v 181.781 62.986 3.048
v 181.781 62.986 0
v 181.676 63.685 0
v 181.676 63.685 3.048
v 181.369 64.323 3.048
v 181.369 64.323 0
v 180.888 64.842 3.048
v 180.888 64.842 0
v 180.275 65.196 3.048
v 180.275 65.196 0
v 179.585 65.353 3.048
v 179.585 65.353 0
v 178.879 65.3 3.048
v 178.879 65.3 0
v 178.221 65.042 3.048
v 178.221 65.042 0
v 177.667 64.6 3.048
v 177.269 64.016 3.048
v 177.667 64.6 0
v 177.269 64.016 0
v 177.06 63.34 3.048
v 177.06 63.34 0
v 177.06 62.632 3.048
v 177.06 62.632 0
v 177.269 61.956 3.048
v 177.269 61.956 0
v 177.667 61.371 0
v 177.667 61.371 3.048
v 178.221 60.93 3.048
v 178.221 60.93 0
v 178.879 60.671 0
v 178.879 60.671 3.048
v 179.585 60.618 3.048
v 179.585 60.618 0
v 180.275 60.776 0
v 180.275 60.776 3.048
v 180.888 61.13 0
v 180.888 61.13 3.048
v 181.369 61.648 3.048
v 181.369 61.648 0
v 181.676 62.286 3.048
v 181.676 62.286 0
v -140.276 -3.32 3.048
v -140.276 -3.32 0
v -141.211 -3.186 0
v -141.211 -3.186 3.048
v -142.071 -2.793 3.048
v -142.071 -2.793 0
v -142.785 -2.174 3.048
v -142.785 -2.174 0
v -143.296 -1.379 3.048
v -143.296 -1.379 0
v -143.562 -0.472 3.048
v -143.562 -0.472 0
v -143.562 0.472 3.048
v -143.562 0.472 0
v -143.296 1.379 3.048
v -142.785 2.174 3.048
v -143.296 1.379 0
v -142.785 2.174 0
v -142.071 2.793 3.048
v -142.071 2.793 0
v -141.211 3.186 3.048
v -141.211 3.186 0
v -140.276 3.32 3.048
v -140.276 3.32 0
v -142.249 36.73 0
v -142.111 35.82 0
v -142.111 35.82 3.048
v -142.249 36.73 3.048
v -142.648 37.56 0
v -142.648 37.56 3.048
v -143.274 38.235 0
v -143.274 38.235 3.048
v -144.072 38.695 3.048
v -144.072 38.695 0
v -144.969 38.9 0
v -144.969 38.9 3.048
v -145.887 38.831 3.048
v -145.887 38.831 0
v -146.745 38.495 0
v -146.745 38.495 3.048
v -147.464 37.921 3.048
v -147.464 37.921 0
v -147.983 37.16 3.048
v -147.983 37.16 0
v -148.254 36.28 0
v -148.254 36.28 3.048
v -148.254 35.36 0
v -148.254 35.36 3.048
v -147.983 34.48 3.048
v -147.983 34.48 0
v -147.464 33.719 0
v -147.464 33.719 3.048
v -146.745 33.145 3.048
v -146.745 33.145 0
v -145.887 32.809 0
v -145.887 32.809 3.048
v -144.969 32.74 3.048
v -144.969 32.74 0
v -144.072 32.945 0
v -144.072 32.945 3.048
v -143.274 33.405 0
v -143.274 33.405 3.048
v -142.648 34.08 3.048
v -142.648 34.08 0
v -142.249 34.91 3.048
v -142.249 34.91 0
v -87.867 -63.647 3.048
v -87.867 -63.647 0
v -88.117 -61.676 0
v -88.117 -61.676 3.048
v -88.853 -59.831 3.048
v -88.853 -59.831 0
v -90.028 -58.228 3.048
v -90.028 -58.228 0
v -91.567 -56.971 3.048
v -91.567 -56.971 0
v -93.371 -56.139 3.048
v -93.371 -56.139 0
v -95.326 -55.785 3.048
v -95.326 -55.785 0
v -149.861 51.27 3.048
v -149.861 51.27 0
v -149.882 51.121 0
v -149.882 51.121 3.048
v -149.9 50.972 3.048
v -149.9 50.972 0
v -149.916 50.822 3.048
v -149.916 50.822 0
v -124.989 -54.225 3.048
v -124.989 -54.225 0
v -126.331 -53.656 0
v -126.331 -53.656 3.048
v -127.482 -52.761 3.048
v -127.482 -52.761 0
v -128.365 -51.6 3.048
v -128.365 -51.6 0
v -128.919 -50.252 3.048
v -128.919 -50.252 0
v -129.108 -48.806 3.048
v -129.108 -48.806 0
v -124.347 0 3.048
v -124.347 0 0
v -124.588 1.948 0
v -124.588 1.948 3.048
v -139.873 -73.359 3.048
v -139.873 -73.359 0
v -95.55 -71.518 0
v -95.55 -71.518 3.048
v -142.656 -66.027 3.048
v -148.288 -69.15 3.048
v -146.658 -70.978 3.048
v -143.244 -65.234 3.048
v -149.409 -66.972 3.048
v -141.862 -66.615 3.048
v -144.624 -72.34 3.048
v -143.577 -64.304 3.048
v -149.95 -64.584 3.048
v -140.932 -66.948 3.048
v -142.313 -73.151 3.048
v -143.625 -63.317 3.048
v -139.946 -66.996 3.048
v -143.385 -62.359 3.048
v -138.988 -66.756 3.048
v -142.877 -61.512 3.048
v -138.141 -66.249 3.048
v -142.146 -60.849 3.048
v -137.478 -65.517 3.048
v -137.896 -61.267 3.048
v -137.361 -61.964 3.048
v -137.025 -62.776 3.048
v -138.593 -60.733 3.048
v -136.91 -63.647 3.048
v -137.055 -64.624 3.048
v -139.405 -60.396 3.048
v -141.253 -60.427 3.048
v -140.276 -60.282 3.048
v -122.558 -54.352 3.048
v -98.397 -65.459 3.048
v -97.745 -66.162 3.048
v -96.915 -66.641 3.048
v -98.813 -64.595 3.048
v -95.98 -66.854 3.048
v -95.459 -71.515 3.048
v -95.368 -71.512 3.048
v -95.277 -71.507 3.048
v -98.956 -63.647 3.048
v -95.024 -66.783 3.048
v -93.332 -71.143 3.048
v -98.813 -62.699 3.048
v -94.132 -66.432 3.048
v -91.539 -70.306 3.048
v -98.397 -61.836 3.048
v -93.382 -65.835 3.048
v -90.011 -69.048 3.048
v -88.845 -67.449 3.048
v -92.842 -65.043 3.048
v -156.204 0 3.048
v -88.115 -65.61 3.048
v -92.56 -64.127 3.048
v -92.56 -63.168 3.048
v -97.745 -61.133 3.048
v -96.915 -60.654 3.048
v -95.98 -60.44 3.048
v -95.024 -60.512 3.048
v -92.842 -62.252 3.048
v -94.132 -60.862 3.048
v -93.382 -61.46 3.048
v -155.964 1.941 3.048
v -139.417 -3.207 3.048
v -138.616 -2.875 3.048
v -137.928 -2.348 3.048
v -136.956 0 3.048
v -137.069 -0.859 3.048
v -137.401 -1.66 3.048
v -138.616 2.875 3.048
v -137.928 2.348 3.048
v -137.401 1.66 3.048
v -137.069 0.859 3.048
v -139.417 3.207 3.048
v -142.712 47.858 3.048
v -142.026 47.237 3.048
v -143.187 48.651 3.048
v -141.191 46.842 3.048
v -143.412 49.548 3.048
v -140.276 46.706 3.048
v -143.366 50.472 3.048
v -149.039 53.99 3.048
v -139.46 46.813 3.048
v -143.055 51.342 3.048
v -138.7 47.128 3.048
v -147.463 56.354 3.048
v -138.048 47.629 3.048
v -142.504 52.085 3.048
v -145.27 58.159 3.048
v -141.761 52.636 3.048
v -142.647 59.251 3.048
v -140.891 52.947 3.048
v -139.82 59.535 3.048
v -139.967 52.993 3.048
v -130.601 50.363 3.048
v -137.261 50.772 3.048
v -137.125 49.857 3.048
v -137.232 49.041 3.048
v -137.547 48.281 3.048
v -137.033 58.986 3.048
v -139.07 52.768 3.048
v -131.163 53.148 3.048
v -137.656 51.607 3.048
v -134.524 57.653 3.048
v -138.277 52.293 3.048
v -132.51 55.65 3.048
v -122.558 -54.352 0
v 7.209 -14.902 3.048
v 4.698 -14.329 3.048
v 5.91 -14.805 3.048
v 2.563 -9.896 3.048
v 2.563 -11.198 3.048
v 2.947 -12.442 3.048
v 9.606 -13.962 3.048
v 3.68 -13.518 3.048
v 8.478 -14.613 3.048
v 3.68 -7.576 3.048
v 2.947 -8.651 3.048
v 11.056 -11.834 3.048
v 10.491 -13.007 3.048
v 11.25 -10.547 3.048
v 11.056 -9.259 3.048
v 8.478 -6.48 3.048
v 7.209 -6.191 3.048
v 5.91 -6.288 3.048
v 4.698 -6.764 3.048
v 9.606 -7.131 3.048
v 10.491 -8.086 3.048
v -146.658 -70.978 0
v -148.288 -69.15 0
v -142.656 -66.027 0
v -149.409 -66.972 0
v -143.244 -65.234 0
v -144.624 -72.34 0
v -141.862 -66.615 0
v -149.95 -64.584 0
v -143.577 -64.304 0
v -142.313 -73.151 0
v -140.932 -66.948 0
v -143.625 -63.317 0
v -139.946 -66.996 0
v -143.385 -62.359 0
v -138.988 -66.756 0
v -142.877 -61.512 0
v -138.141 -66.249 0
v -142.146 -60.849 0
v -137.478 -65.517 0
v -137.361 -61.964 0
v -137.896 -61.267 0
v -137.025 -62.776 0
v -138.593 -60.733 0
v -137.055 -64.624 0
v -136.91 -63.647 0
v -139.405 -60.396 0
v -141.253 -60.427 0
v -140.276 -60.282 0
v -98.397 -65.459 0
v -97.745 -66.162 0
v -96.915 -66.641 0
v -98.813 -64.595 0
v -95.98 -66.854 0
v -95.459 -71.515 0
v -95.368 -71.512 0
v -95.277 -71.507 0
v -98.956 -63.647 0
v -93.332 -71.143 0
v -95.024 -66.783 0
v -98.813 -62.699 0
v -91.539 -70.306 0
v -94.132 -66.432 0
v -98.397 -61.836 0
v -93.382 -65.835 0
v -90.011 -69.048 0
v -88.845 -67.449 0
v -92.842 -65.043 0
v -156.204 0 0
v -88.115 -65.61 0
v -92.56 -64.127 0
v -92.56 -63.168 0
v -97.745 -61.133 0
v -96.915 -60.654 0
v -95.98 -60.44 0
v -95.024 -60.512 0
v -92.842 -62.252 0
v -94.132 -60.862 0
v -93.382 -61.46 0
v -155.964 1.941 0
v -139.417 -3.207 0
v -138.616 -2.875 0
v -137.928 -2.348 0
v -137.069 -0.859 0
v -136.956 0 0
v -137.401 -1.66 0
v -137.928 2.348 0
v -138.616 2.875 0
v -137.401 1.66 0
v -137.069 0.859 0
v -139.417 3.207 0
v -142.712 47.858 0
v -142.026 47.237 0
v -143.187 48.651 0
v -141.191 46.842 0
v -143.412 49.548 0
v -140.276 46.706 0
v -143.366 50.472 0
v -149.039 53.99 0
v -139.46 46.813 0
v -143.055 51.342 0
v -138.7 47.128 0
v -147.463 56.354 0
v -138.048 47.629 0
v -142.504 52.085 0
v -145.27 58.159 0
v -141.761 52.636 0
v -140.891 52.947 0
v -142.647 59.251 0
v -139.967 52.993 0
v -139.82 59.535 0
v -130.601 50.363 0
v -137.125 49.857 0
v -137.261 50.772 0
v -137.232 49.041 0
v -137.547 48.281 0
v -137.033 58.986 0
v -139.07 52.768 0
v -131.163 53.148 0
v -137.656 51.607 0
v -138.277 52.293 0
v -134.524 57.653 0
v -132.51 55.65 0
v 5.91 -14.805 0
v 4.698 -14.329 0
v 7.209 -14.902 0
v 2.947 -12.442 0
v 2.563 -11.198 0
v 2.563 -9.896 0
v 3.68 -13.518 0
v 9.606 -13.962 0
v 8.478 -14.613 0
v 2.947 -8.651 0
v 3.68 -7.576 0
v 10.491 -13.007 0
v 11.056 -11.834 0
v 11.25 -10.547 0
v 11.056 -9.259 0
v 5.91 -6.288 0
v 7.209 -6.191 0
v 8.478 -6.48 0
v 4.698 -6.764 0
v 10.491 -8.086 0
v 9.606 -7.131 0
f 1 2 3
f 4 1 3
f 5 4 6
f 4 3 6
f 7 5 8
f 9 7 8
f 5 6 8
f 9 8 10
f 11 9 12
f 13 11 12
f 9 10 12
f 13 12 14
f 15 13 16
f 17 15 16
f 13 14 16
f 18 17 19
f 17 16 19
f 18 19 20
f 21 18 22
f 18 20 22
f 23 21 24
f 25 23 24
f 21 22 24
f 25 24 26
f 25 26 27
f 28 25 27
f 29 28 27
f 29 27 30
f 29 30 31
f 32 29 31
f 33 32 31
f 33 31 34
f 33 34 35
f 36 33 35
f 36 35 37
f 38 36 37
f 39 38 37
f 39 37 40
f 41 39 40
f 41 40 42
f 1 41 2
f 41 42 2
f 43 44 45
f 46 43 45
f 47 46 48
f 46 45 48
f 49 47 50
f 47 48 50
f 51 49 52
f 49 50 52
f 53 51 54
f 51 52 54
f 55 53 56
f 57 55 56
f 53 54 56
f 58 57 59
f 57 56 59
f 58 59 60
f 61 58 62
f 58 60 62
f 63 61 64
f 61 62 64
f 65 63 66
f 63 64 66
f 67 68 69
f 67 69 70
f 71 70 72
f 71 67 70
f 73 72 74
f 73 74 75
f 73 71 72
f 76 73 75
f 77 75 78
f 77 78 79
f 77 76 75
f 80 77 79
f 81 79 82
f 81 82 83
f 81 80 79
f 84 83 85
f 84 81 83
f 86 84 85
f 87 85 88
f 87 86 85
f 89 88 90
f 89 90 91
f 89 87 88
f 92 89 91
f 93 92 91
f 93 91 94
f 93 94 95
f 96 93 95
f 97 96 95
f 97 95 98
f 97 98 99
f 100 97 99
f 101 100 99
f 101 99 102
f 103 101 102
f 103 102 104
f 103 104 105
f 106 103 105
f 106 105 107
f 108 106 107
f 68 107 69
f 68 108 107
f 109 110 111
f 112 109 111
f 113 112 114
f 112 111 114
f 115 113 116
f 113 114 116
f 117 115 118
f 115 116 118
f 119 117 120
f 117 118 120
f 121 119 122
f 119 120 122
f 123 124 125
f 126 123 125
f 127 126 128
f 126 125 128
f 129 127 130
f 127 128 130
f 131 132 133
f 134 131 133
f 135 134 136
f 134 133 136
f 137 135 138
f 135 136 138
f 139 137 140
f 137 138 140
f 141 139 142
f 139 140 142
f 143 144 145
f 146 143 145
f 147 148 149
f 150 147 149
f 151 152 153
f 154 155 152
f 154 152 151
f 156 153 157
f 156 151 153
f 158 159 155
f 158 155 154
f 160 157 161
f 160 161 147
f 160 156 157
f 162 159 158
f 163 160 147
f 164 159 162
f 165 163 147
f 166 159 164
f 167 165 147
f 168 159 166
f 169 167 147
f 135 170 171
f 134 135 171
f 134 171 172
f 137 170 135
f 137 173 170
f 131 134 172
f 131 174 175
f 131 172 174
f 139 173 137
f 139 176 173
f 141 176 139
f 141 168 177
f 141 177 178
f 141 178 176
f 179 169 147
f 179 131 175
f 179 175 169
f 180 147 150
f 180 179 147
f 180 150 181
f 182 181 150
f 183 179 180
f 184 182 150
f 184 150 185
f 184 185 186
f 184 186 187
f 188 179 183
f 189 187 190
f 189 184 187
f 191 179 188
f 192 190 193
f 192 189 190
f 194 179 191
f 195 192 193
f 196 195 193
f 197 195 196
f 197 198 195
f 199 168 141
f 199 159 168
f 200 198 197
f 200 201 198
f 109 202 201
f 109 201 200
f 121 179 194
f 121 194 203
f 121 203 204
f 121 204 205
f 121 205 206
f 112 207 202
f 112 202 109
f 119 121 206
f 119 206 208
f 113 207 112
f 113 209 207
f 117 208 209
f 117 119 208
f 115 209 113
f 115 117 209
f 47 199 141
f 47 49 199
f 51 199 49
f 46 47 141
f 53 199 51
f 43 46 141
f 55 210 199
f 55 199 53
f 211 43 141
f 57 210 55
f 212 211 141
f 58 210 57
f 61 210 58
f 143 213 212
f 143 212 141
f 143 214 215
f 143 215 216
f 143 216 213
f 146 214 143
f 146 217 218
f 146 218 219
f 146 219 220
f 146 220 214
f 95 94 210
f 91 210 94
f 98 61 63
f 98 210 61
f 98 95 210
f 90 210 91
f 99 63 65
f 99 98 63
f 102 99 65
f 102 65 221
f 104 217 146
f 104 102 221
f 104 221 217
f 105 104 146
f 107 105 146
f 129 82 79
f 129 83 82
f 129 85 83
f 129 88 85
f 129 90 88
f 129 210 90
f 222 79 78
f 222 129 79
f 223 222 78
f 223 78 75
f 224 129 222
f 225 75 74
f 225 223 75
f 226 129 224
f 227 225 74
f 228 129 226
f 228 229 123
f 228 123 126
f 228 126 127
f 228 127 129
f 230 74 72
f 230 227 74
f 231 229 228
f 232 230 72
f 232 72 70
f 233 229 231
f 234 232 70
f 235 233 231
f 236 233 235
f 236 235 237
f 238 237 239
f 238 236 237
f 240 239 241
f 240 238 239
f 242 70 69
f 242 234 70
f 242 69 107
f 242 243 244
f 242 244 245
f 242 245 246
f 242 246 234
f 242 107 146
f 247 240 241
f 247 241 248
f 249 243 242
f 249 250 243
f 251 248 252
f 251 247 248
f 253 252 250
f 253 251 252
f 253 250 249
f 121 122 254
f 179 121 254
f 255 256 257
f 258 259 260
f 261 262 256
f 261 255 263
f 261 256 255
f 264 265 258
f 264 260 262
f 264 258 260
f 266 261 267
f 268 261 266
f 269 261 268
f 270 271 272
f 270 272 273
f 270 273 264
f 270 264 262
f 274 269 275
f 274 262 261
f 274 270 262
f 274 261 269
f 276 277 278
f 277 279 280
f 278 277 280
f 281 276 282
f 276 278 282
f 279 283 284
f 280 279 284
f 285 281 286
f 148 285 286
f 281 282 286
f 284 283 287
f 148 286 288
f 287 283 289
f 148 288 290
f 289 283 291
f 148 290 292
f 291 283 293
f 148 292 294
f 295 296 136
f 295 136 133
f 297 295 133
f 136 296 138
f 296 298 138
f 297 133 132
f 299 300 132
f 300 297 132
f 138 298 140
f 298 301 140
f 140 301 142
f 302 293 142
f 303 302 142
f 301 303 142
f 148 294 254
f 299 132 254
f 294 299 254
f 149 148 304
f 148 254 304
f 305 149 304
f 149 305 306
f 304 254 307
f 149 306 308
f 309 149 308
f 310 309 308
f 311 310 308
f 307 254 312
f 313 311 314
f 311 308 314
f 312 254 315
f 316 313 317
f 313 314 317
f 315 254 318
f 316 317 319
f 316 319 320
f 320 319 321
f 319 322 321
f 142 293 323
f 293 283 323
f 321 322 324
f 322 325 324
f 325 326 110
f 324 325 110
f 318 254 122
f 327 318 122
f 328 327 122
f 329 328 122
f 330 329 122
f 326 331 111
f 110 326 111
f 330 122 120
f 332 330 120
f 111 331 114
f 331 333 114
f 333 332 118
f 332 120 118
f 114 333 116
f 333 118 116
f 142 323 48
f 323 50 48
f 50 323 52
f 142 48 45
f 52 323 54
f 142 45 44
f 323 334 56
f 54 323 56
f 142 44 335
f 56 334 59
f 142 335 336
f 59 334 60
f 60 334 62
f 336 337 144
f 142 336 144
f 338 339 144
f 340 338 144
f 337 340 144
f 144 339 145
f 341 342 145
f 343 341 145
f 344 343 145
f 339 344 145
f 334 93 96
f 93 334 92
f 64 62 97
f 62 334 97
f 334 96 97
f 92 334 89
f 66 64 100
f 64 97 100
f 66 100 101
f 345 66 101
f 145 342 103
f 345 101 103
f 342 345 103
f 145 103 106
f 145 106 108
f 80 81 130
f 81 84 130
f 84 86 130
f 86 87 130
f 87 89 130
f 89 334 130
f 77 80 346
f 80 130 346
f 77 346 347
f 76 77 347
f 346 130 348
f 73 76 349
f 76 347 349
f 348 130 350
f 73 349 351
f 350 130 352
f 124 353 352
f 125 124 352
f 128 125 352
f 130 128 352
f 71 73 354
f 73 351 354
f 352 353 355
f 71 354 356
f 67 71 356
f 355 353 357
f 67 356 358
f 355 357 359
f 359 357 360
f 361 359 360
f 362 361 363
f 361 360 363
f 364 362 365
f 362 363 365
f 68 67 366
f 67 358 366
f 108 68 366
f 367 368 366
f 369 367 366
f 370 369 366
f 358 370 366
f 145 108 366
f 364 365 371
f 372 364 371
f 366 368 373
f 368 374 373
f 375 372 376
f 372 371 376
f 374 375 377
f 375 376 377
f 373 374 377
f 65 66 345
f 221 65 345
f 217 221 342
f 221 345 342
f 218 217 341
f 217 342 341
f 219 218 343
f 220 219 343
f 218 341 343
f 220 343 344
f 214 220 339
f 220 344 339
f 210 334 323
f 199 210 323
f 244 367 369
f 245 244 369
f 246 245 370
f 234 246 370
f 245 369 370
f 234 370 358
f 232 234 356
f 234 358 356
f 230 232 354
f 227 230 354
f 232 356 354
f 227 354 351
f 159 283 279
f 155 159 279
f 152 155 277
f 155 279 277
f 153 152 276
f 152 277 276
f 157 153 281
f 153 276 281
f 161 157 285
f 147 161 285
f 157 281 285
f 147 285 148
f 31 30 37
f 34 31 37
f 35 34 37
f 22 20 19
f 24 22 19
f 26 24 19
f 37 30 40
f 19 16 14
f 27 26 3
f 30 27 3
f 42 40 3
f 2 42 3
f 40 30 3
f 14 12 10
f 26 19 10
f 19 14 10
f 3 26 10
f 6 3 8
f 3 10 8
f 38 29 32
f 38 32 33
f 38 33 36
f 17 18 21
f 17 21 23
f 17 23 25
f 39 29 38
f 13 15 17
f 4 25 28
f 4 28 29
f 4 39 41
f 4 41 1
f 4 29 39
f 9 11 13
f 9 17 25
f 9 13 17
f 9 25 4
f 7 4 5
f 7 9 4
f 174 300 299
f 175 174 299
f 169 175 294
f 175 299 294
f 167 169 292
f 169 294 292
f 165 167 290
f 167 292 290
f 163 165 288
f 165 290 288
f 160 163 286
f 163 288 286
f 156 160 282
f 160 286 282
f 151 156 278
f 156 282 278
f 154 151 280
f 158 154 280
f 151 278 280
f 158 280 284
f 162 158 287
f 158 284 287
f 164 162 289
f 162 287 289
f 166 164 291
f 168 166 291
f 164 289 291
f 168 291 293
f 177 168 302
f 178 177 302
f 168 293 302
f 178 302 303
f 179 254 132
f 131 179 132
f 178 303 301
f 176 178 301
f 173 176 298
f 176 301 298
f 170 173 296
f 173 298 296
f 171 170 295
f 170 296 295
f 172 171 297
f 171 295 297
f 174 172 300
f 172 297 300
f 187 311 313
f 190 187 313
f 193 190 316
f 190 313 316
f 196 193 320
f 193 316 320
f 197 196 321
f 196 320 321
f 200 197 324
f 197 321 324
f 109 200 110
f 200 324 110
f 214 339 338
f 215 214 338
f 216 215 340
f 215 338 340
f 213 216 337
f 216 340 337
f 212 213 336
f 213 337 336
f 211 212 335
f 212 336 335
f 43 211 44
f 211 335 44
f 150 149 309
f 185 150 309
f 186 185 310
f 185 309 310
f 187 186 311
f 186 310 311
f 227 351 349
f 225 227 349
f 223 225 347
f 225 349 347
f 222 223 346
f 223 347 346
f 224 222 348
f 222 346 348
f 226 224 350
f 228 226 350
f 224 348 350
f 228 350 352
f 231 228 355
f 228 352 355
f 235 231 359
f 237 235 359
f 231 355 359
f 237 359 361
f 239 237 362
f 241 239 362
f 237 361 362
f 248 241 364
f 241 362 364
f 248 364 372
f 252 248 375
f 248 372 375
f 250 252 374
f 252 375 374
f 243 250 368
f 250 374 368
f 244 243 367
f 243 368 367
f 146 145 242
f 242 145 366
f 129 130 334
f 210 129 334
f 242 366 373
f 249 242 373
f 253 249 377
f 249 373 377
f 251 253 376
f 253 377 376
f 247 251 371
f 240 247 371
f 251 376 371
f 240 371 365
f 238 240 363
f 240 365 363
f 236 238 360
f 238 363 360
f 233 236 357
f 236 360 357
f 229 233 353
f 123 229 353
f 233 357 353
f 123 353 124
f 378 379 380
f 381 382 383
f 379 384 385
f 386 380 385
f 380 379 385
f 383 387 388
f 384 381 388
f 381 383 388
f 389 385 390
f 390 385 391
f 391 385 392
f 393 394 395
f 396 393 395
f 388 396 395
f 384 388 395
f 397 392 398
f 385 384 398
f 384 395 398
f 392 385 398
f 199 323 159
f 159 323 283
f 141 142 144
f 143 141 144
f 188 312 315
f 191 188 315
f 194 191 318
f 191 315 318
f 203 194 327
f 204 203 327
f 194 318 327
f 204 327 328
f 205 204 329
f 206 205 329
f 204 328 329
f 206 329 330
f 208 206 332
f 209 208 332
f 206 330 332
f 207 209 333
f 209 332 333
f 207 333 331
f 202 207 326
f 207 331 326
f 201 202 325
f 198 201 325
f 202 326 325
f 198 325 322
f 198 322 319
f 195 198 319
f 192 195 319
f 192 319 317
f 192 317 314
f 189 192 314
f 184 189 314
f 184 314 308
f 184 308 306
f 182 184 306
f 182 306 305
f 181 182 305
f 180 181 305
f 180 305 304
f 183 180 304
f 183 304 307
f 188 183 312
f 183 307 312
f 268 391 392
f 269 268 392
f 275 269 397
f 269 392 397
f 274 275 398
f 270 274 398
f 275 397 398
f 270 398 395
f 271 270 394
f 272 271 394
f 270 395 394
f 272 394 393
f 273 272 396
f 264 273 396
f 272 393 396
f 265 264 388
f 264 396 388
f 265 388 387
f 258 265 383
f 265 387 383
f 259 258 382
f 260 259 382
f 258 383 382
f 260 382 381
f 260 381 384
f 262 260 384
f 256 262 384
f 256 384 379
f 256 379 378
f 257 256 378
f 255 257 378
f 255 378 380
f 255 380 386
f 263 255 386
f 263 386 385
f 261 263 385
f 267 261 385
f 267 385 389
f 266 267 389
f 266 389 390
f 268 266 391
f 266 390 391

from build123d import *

# Parameters (mm, degrees)
F0_R     = 3.0886982289
F1_DEPTH = 3.048
F0_R_2   = 2.3739096922
F0_R_3   = 4.3680824595


with BuildPart() as f1:
    # F0 (on Top) → F1 (new body)
    with BuildSketch(Plane.XY):
        with BuildLine():
            ThreePointArc((-140.2758508921, 40.1682988362), (-133.4250060926, 43.0060116659), (-130.587293263, 49.8568564653))
            ThreePointArc((-130.587293263, 49.8568564653), (-130.5906056645, 50.1101819761), (-130.6005406042, 50.363334269))
            ThreePointArc((-130.6005406042, 50.363334269), (-139.8201268297, 59.5346901337), (-149.8607536893, 51.2702875036))
            Line((-149.8607536893, 51.2702875036), (-149.9162041011, 50.8221227176))
            ThreePointArc((-149.9162041011, 50.8221227176), (-147.4598674095, 43.3562368326), (-140.2758508921, 40.1682988362))
        make_face()
        with BuildLine():
            ThreePointArc((-137.1249175173, 49.8568564653), (-138.0478045357, 47.628810109), (-140.2758508921, 46.7059230906))
            ThreePointArc((-140.2758508921, 46.7059230906), (-142.5038972484, 52.0849028217), (-137.1249175173, 49.8568564653))
        make_face(mode=Mode.SUBTRACT)
        with BuildLine():
            ThreePointArc((-130.6005406042, 50.363334269), (-130.5906056645, 50.1101819761), (-130.587293263, 49.8568564653))
            ThreePointArc((-130.587293263, 49.8568564653), (-133.4250060926, 43.0060116659), (-140.2758508921, 40.1682988362))
            Line((-140.2758508921, 40.1682988362), (-140.2758508921, 15.8079204882))
            ThreePointArc((-140.2758508921, 15.8079204882), (-129.8093341247, 11.8466187969), (-124.5884194722, 1.9480363467))
            Line((-124.5884194722, 1.9480363467), (-130.6005406042, 50.363334269))
        make_face()
        with BuildLine():
            Line((-140.2758508921, 15.8079204882), (-140.2758508921, 40.1682988362))
            ThreePointArc((-140.2758508921, 40.1682988362), (-147.4598674095, 43.3562368326), (-149.9162041011, 50.8221227176))
            Line((-149.9162041011, 50.8221227176), (-155.9641448625, 1.9410776537))
            ThreePointArc((-155.9641448625, 1.9410776537), (-150.7449948148, 11.8442971799), (-140.2758508921, 15.8079204882))
        make_face()
        with Locations((-145.2001780272, 35.8199849725)):
            Circle(F0_R, mode=Mode.SUBTRACT)
        with BuildLine():
            Line((-149.9162041011, 50.8221227176), (-149.8607536893, 51.2702875036))
            ThreePointArc((-149.8607536893, 51.2702875036), (-149.891090361, 51.0465282213), (-149.9162041011, 50.8221227176))
        make_face()
        with BuildLine():
            Line((-124.3465159626, 0), (-124.5884194722, 1.9480363467))
            ThreePointArc((-124.5884194722, 1.9480363467), (-124.498081425, 0.9758795038), (-124.4679304039, 0))
            ThreePointArc((-124.4679304039, 0), (-129.0979631184, -11.1778877737), (-140.2758508921, -15.8079204882))
            Line((-140.2758508921, -15.8079204882), (-140.2758508921, -53.9274445312))
            ThreePointArc((-140.2758508921, -53.9274445312), (-133.4029489314, -56.7742937362), (-130.5560997264, -63.6471956968))
            Line((-130.5560997264, -63.6471956968), (-103.61304343, -63.6471956968))
            ThreePointArc((-103.61304343, -63.6471956968), (-101.1588327279, -57.9356262325), (-95.3262316546, -55.784826233))
            Line((-95.3262316546, -55.784826233), (-122.5580726915, -54.3523901093))
            ThreePointArc((-122.5580726915, -54.3523901093), (-123.7804203944, -54.4215588639), (-124.9887658024, -54.2245319666))
            ThreePointArc((-124.9887658024, -54.2245319666), (-127.961419377, -52.2093659514), (-129.1081595947, -48.8060513587))
            ThreePointArc((-129.1081595947, -48.8060513587), (-129.0815874585, -48.2601937732), (-129.0021522356, -47.7194936462))
            Line((-129.0021522356, -47.7194936462), (-124.3465159626, 0))
        make_face()
        with BuildLine():
            ThreePointArc((-124.4679304039, 0), (-124.498081425, 0.9758795038), (-124.5884194722, 1.9480363467))
            ThreePointArc((-124.5884194722, 1.9480363467), (-129.8093341247, 11.8466187969), (-140.2758508921, 15.8079204882))
            Line((-140.2758508921, 15.8079204882), (-140.2758508921, 3.3200765481))
            ThreePointArc((-140.2758508921, 3.3200765481), (-137.9282022508, 2.3476486413), (-136.9557743439, 0))
            ThreePointArc((-136.9557743439, 0), (-137.9282022508, -2.3476486413), (-140.2758508921, -3.3200765481))
            Line((-140.2758508921, -3.3200765481), (-140.2758508921, -15.8079204882))
            ThreePointArc((-140.2758508921, -15.8079204882), (-129.0979631184, -11.1778877737), (-124.4679304039, 0))
        make_face()
        with BuildLine():
            Line((-140.2758508921, 3.3200765481), (-140.2758508921, 15.8079204882))
            ThreePointArc((-140.2758508921, 15.8079204882), (-150.7449948148, 11.8442971799), (-155.9641448625, 1.9410776537))
            ThreePointArc((-155.9641448625, 1.9410776537), (-152.120148072, -10.4691439228), (-140.2758508921, -15.8079204882))
            Line((-140.2758508921, -15.8079204882), (-140.2758508921, -3.3200765481))
            ThreePointArc((-140.2758508921, -3.3200765481), (-143.5959274402, 0), (-140.2758508921, 3.3200765481))
        make_face()
        with BuildLine():
            ThreePointArc((-140.2758508921, -15.8079204882), (-152.120148072, -10.4691439228), (-155.9641448625, 1.9410776537))
            Line((-155.9641448625, 1.9410776537), (-156.204309995, 0))
            Line((-156.204309995, 0), (-149.9503494028, -64.5840208074))
            ThreePointArc((-149.9503494028, -64.5840208074), (-147.4723524617, -57.1139018966), (-140.2758508921, -53.9274445312))
            Line((-140.2758508921, -53.9274445312), (-140.2758508921, -15.8079204882))
        make_face()
        with BuildLine():
            Line((-129.1081595947, -48.8060513587), (-129.0021522356, -47.7194936462))
            ThreePointArc((-129.0021522356, -47.7194936462), (-129.0815874585, -48.2601937732), (-129.1081595947, -48.8060513587))
        make_face()
        with BuildLine():
            ThreePointArc((-130.5560997264, -63.6471956968), (-133.4029489314, -56.7742937362), (-140.2758508921, -53.9274445312))
            ThreePointArc((-140.2758508921, -53.9274445312), (-147.4723524617, -57.1139018966), (-149.9503494028, -64.5840208074))
            ThreePointArc((-149.9503494028, -64.5840208074), (-146.6584228149, -70.9777030716), (-139.8726003304, -73.3585782815))
            ThreePointArc((-139.8726003304, -73.3585782815), (-133.2618271596, -70.3760168271), (-130.5560997264, -63.6471956968))
        make_face()
        with BuildLine():
            ThreePointArc((-140.2758508921, -60.2817385712), (-137.8961133368, -61.2674581415), (-136.9103937665, -63.6471956968))
            ThreePointArc((-136.9103937665, -63.6471956968), (-142.6555884474, -66.0269332521), (-140.2758508921, -60.2817385712))
        make_face(mode=Mode.SUBTRACT)
        with BuildLine():
            Line((-103.61304343, -63.6471956968), (-130.5560997264, -63.6471956968))
            ThreePointArc((-130.5560997264, -63.6471956968), (-133.2618271596, -70.3760168271), (-139.8726003304, -73.3585782815))
            Line((-139.8726003304, -73.3585782815), (-95.5498732555, -71.518143675))
            ThreePointArc((-95.5498732555, -71.518143675), (-101.2394643803, -69.2811671056), (-103.61304343, -63.6471956968))
        make_face()
        with BuildLine():
            Line((-122.5580726915, -54.3523901093), (-124.9887658024, -54.2245319666))
            ThreePointArc((-124.9887658024, -54.2245319666), (-123.7804203944, -54.4215588639), (-122.5580726915, -54.3523901093))
        make_face()
        with BuildLine():
            ThreePointArc((-95.3262316546, -55.784826233), (-101.1588327279, -57.9356262325), (-103.61304343, -63.6471956968))
            ThreePointArc((-103.61304343, -63.6471956968), (-101.2394643803, -69.2811671056), (-95.5498732555, -71.518143675))
            Line((-95.5498732555, -71.518143675), (-95.2765478659, -71.5067942491))
            ThreePointArc((-95.2765478659, -71.5067942491), (-90.0111384017, -69.0481478276), (-87.8665649866, -63.6471956968))
            ThreePointArc((-87.8665649866, -63.6471956968), (-90.0282347439, -58.2281671773), (-95.3262316546, -55.784826233))
        make_face()
        with BuildLine():
            ThreePointArc((-92.5238399909, -63.6471956968), (-95.7398042083, -66.8631599142), (-98.9557684257, -63.6471956968))
            ThreePointArc((-98.9557684257, -63.6471956968), (-95.7398042083, -60.4312314794), (-92.5238399909, -63.6471956968))
        make_face(mode=Mode.SUBTRACT)
        with BuildLine():
            Line((-95.2765478659, -71.5067942491), (-95.5498732555, -71.518143675))
            ThreePointArc((-95.5498732555, -71.518143675), (-95.413161264, -71.5136561607), (-95.2765478659, -71.5067942491))
        make_face()
    extrude(amount=F1_DEPTH)


with BuildPart() as f1b:
    # F0 (on Top) → F1, piece 2 (new body)
    with BuildSketch(Plane.XY):
        with Locations((179.4074773788, 62.9857331514)):
            Circle(F0_R_2)
    extrude(amount=F1_DEPTH)


with BuildPart() as f1c:
    # F0 (on Top) → F1, piece 3 (new body)
    with BuildSketch(Plane.XY):
        with Locations((6.8824104965, -10.5465641245)):
            Circle(F0_R_3)
    extrude(amount=F1_DEPTH)


solid = Compound([f1.part, f1b.part, f1c.part])
